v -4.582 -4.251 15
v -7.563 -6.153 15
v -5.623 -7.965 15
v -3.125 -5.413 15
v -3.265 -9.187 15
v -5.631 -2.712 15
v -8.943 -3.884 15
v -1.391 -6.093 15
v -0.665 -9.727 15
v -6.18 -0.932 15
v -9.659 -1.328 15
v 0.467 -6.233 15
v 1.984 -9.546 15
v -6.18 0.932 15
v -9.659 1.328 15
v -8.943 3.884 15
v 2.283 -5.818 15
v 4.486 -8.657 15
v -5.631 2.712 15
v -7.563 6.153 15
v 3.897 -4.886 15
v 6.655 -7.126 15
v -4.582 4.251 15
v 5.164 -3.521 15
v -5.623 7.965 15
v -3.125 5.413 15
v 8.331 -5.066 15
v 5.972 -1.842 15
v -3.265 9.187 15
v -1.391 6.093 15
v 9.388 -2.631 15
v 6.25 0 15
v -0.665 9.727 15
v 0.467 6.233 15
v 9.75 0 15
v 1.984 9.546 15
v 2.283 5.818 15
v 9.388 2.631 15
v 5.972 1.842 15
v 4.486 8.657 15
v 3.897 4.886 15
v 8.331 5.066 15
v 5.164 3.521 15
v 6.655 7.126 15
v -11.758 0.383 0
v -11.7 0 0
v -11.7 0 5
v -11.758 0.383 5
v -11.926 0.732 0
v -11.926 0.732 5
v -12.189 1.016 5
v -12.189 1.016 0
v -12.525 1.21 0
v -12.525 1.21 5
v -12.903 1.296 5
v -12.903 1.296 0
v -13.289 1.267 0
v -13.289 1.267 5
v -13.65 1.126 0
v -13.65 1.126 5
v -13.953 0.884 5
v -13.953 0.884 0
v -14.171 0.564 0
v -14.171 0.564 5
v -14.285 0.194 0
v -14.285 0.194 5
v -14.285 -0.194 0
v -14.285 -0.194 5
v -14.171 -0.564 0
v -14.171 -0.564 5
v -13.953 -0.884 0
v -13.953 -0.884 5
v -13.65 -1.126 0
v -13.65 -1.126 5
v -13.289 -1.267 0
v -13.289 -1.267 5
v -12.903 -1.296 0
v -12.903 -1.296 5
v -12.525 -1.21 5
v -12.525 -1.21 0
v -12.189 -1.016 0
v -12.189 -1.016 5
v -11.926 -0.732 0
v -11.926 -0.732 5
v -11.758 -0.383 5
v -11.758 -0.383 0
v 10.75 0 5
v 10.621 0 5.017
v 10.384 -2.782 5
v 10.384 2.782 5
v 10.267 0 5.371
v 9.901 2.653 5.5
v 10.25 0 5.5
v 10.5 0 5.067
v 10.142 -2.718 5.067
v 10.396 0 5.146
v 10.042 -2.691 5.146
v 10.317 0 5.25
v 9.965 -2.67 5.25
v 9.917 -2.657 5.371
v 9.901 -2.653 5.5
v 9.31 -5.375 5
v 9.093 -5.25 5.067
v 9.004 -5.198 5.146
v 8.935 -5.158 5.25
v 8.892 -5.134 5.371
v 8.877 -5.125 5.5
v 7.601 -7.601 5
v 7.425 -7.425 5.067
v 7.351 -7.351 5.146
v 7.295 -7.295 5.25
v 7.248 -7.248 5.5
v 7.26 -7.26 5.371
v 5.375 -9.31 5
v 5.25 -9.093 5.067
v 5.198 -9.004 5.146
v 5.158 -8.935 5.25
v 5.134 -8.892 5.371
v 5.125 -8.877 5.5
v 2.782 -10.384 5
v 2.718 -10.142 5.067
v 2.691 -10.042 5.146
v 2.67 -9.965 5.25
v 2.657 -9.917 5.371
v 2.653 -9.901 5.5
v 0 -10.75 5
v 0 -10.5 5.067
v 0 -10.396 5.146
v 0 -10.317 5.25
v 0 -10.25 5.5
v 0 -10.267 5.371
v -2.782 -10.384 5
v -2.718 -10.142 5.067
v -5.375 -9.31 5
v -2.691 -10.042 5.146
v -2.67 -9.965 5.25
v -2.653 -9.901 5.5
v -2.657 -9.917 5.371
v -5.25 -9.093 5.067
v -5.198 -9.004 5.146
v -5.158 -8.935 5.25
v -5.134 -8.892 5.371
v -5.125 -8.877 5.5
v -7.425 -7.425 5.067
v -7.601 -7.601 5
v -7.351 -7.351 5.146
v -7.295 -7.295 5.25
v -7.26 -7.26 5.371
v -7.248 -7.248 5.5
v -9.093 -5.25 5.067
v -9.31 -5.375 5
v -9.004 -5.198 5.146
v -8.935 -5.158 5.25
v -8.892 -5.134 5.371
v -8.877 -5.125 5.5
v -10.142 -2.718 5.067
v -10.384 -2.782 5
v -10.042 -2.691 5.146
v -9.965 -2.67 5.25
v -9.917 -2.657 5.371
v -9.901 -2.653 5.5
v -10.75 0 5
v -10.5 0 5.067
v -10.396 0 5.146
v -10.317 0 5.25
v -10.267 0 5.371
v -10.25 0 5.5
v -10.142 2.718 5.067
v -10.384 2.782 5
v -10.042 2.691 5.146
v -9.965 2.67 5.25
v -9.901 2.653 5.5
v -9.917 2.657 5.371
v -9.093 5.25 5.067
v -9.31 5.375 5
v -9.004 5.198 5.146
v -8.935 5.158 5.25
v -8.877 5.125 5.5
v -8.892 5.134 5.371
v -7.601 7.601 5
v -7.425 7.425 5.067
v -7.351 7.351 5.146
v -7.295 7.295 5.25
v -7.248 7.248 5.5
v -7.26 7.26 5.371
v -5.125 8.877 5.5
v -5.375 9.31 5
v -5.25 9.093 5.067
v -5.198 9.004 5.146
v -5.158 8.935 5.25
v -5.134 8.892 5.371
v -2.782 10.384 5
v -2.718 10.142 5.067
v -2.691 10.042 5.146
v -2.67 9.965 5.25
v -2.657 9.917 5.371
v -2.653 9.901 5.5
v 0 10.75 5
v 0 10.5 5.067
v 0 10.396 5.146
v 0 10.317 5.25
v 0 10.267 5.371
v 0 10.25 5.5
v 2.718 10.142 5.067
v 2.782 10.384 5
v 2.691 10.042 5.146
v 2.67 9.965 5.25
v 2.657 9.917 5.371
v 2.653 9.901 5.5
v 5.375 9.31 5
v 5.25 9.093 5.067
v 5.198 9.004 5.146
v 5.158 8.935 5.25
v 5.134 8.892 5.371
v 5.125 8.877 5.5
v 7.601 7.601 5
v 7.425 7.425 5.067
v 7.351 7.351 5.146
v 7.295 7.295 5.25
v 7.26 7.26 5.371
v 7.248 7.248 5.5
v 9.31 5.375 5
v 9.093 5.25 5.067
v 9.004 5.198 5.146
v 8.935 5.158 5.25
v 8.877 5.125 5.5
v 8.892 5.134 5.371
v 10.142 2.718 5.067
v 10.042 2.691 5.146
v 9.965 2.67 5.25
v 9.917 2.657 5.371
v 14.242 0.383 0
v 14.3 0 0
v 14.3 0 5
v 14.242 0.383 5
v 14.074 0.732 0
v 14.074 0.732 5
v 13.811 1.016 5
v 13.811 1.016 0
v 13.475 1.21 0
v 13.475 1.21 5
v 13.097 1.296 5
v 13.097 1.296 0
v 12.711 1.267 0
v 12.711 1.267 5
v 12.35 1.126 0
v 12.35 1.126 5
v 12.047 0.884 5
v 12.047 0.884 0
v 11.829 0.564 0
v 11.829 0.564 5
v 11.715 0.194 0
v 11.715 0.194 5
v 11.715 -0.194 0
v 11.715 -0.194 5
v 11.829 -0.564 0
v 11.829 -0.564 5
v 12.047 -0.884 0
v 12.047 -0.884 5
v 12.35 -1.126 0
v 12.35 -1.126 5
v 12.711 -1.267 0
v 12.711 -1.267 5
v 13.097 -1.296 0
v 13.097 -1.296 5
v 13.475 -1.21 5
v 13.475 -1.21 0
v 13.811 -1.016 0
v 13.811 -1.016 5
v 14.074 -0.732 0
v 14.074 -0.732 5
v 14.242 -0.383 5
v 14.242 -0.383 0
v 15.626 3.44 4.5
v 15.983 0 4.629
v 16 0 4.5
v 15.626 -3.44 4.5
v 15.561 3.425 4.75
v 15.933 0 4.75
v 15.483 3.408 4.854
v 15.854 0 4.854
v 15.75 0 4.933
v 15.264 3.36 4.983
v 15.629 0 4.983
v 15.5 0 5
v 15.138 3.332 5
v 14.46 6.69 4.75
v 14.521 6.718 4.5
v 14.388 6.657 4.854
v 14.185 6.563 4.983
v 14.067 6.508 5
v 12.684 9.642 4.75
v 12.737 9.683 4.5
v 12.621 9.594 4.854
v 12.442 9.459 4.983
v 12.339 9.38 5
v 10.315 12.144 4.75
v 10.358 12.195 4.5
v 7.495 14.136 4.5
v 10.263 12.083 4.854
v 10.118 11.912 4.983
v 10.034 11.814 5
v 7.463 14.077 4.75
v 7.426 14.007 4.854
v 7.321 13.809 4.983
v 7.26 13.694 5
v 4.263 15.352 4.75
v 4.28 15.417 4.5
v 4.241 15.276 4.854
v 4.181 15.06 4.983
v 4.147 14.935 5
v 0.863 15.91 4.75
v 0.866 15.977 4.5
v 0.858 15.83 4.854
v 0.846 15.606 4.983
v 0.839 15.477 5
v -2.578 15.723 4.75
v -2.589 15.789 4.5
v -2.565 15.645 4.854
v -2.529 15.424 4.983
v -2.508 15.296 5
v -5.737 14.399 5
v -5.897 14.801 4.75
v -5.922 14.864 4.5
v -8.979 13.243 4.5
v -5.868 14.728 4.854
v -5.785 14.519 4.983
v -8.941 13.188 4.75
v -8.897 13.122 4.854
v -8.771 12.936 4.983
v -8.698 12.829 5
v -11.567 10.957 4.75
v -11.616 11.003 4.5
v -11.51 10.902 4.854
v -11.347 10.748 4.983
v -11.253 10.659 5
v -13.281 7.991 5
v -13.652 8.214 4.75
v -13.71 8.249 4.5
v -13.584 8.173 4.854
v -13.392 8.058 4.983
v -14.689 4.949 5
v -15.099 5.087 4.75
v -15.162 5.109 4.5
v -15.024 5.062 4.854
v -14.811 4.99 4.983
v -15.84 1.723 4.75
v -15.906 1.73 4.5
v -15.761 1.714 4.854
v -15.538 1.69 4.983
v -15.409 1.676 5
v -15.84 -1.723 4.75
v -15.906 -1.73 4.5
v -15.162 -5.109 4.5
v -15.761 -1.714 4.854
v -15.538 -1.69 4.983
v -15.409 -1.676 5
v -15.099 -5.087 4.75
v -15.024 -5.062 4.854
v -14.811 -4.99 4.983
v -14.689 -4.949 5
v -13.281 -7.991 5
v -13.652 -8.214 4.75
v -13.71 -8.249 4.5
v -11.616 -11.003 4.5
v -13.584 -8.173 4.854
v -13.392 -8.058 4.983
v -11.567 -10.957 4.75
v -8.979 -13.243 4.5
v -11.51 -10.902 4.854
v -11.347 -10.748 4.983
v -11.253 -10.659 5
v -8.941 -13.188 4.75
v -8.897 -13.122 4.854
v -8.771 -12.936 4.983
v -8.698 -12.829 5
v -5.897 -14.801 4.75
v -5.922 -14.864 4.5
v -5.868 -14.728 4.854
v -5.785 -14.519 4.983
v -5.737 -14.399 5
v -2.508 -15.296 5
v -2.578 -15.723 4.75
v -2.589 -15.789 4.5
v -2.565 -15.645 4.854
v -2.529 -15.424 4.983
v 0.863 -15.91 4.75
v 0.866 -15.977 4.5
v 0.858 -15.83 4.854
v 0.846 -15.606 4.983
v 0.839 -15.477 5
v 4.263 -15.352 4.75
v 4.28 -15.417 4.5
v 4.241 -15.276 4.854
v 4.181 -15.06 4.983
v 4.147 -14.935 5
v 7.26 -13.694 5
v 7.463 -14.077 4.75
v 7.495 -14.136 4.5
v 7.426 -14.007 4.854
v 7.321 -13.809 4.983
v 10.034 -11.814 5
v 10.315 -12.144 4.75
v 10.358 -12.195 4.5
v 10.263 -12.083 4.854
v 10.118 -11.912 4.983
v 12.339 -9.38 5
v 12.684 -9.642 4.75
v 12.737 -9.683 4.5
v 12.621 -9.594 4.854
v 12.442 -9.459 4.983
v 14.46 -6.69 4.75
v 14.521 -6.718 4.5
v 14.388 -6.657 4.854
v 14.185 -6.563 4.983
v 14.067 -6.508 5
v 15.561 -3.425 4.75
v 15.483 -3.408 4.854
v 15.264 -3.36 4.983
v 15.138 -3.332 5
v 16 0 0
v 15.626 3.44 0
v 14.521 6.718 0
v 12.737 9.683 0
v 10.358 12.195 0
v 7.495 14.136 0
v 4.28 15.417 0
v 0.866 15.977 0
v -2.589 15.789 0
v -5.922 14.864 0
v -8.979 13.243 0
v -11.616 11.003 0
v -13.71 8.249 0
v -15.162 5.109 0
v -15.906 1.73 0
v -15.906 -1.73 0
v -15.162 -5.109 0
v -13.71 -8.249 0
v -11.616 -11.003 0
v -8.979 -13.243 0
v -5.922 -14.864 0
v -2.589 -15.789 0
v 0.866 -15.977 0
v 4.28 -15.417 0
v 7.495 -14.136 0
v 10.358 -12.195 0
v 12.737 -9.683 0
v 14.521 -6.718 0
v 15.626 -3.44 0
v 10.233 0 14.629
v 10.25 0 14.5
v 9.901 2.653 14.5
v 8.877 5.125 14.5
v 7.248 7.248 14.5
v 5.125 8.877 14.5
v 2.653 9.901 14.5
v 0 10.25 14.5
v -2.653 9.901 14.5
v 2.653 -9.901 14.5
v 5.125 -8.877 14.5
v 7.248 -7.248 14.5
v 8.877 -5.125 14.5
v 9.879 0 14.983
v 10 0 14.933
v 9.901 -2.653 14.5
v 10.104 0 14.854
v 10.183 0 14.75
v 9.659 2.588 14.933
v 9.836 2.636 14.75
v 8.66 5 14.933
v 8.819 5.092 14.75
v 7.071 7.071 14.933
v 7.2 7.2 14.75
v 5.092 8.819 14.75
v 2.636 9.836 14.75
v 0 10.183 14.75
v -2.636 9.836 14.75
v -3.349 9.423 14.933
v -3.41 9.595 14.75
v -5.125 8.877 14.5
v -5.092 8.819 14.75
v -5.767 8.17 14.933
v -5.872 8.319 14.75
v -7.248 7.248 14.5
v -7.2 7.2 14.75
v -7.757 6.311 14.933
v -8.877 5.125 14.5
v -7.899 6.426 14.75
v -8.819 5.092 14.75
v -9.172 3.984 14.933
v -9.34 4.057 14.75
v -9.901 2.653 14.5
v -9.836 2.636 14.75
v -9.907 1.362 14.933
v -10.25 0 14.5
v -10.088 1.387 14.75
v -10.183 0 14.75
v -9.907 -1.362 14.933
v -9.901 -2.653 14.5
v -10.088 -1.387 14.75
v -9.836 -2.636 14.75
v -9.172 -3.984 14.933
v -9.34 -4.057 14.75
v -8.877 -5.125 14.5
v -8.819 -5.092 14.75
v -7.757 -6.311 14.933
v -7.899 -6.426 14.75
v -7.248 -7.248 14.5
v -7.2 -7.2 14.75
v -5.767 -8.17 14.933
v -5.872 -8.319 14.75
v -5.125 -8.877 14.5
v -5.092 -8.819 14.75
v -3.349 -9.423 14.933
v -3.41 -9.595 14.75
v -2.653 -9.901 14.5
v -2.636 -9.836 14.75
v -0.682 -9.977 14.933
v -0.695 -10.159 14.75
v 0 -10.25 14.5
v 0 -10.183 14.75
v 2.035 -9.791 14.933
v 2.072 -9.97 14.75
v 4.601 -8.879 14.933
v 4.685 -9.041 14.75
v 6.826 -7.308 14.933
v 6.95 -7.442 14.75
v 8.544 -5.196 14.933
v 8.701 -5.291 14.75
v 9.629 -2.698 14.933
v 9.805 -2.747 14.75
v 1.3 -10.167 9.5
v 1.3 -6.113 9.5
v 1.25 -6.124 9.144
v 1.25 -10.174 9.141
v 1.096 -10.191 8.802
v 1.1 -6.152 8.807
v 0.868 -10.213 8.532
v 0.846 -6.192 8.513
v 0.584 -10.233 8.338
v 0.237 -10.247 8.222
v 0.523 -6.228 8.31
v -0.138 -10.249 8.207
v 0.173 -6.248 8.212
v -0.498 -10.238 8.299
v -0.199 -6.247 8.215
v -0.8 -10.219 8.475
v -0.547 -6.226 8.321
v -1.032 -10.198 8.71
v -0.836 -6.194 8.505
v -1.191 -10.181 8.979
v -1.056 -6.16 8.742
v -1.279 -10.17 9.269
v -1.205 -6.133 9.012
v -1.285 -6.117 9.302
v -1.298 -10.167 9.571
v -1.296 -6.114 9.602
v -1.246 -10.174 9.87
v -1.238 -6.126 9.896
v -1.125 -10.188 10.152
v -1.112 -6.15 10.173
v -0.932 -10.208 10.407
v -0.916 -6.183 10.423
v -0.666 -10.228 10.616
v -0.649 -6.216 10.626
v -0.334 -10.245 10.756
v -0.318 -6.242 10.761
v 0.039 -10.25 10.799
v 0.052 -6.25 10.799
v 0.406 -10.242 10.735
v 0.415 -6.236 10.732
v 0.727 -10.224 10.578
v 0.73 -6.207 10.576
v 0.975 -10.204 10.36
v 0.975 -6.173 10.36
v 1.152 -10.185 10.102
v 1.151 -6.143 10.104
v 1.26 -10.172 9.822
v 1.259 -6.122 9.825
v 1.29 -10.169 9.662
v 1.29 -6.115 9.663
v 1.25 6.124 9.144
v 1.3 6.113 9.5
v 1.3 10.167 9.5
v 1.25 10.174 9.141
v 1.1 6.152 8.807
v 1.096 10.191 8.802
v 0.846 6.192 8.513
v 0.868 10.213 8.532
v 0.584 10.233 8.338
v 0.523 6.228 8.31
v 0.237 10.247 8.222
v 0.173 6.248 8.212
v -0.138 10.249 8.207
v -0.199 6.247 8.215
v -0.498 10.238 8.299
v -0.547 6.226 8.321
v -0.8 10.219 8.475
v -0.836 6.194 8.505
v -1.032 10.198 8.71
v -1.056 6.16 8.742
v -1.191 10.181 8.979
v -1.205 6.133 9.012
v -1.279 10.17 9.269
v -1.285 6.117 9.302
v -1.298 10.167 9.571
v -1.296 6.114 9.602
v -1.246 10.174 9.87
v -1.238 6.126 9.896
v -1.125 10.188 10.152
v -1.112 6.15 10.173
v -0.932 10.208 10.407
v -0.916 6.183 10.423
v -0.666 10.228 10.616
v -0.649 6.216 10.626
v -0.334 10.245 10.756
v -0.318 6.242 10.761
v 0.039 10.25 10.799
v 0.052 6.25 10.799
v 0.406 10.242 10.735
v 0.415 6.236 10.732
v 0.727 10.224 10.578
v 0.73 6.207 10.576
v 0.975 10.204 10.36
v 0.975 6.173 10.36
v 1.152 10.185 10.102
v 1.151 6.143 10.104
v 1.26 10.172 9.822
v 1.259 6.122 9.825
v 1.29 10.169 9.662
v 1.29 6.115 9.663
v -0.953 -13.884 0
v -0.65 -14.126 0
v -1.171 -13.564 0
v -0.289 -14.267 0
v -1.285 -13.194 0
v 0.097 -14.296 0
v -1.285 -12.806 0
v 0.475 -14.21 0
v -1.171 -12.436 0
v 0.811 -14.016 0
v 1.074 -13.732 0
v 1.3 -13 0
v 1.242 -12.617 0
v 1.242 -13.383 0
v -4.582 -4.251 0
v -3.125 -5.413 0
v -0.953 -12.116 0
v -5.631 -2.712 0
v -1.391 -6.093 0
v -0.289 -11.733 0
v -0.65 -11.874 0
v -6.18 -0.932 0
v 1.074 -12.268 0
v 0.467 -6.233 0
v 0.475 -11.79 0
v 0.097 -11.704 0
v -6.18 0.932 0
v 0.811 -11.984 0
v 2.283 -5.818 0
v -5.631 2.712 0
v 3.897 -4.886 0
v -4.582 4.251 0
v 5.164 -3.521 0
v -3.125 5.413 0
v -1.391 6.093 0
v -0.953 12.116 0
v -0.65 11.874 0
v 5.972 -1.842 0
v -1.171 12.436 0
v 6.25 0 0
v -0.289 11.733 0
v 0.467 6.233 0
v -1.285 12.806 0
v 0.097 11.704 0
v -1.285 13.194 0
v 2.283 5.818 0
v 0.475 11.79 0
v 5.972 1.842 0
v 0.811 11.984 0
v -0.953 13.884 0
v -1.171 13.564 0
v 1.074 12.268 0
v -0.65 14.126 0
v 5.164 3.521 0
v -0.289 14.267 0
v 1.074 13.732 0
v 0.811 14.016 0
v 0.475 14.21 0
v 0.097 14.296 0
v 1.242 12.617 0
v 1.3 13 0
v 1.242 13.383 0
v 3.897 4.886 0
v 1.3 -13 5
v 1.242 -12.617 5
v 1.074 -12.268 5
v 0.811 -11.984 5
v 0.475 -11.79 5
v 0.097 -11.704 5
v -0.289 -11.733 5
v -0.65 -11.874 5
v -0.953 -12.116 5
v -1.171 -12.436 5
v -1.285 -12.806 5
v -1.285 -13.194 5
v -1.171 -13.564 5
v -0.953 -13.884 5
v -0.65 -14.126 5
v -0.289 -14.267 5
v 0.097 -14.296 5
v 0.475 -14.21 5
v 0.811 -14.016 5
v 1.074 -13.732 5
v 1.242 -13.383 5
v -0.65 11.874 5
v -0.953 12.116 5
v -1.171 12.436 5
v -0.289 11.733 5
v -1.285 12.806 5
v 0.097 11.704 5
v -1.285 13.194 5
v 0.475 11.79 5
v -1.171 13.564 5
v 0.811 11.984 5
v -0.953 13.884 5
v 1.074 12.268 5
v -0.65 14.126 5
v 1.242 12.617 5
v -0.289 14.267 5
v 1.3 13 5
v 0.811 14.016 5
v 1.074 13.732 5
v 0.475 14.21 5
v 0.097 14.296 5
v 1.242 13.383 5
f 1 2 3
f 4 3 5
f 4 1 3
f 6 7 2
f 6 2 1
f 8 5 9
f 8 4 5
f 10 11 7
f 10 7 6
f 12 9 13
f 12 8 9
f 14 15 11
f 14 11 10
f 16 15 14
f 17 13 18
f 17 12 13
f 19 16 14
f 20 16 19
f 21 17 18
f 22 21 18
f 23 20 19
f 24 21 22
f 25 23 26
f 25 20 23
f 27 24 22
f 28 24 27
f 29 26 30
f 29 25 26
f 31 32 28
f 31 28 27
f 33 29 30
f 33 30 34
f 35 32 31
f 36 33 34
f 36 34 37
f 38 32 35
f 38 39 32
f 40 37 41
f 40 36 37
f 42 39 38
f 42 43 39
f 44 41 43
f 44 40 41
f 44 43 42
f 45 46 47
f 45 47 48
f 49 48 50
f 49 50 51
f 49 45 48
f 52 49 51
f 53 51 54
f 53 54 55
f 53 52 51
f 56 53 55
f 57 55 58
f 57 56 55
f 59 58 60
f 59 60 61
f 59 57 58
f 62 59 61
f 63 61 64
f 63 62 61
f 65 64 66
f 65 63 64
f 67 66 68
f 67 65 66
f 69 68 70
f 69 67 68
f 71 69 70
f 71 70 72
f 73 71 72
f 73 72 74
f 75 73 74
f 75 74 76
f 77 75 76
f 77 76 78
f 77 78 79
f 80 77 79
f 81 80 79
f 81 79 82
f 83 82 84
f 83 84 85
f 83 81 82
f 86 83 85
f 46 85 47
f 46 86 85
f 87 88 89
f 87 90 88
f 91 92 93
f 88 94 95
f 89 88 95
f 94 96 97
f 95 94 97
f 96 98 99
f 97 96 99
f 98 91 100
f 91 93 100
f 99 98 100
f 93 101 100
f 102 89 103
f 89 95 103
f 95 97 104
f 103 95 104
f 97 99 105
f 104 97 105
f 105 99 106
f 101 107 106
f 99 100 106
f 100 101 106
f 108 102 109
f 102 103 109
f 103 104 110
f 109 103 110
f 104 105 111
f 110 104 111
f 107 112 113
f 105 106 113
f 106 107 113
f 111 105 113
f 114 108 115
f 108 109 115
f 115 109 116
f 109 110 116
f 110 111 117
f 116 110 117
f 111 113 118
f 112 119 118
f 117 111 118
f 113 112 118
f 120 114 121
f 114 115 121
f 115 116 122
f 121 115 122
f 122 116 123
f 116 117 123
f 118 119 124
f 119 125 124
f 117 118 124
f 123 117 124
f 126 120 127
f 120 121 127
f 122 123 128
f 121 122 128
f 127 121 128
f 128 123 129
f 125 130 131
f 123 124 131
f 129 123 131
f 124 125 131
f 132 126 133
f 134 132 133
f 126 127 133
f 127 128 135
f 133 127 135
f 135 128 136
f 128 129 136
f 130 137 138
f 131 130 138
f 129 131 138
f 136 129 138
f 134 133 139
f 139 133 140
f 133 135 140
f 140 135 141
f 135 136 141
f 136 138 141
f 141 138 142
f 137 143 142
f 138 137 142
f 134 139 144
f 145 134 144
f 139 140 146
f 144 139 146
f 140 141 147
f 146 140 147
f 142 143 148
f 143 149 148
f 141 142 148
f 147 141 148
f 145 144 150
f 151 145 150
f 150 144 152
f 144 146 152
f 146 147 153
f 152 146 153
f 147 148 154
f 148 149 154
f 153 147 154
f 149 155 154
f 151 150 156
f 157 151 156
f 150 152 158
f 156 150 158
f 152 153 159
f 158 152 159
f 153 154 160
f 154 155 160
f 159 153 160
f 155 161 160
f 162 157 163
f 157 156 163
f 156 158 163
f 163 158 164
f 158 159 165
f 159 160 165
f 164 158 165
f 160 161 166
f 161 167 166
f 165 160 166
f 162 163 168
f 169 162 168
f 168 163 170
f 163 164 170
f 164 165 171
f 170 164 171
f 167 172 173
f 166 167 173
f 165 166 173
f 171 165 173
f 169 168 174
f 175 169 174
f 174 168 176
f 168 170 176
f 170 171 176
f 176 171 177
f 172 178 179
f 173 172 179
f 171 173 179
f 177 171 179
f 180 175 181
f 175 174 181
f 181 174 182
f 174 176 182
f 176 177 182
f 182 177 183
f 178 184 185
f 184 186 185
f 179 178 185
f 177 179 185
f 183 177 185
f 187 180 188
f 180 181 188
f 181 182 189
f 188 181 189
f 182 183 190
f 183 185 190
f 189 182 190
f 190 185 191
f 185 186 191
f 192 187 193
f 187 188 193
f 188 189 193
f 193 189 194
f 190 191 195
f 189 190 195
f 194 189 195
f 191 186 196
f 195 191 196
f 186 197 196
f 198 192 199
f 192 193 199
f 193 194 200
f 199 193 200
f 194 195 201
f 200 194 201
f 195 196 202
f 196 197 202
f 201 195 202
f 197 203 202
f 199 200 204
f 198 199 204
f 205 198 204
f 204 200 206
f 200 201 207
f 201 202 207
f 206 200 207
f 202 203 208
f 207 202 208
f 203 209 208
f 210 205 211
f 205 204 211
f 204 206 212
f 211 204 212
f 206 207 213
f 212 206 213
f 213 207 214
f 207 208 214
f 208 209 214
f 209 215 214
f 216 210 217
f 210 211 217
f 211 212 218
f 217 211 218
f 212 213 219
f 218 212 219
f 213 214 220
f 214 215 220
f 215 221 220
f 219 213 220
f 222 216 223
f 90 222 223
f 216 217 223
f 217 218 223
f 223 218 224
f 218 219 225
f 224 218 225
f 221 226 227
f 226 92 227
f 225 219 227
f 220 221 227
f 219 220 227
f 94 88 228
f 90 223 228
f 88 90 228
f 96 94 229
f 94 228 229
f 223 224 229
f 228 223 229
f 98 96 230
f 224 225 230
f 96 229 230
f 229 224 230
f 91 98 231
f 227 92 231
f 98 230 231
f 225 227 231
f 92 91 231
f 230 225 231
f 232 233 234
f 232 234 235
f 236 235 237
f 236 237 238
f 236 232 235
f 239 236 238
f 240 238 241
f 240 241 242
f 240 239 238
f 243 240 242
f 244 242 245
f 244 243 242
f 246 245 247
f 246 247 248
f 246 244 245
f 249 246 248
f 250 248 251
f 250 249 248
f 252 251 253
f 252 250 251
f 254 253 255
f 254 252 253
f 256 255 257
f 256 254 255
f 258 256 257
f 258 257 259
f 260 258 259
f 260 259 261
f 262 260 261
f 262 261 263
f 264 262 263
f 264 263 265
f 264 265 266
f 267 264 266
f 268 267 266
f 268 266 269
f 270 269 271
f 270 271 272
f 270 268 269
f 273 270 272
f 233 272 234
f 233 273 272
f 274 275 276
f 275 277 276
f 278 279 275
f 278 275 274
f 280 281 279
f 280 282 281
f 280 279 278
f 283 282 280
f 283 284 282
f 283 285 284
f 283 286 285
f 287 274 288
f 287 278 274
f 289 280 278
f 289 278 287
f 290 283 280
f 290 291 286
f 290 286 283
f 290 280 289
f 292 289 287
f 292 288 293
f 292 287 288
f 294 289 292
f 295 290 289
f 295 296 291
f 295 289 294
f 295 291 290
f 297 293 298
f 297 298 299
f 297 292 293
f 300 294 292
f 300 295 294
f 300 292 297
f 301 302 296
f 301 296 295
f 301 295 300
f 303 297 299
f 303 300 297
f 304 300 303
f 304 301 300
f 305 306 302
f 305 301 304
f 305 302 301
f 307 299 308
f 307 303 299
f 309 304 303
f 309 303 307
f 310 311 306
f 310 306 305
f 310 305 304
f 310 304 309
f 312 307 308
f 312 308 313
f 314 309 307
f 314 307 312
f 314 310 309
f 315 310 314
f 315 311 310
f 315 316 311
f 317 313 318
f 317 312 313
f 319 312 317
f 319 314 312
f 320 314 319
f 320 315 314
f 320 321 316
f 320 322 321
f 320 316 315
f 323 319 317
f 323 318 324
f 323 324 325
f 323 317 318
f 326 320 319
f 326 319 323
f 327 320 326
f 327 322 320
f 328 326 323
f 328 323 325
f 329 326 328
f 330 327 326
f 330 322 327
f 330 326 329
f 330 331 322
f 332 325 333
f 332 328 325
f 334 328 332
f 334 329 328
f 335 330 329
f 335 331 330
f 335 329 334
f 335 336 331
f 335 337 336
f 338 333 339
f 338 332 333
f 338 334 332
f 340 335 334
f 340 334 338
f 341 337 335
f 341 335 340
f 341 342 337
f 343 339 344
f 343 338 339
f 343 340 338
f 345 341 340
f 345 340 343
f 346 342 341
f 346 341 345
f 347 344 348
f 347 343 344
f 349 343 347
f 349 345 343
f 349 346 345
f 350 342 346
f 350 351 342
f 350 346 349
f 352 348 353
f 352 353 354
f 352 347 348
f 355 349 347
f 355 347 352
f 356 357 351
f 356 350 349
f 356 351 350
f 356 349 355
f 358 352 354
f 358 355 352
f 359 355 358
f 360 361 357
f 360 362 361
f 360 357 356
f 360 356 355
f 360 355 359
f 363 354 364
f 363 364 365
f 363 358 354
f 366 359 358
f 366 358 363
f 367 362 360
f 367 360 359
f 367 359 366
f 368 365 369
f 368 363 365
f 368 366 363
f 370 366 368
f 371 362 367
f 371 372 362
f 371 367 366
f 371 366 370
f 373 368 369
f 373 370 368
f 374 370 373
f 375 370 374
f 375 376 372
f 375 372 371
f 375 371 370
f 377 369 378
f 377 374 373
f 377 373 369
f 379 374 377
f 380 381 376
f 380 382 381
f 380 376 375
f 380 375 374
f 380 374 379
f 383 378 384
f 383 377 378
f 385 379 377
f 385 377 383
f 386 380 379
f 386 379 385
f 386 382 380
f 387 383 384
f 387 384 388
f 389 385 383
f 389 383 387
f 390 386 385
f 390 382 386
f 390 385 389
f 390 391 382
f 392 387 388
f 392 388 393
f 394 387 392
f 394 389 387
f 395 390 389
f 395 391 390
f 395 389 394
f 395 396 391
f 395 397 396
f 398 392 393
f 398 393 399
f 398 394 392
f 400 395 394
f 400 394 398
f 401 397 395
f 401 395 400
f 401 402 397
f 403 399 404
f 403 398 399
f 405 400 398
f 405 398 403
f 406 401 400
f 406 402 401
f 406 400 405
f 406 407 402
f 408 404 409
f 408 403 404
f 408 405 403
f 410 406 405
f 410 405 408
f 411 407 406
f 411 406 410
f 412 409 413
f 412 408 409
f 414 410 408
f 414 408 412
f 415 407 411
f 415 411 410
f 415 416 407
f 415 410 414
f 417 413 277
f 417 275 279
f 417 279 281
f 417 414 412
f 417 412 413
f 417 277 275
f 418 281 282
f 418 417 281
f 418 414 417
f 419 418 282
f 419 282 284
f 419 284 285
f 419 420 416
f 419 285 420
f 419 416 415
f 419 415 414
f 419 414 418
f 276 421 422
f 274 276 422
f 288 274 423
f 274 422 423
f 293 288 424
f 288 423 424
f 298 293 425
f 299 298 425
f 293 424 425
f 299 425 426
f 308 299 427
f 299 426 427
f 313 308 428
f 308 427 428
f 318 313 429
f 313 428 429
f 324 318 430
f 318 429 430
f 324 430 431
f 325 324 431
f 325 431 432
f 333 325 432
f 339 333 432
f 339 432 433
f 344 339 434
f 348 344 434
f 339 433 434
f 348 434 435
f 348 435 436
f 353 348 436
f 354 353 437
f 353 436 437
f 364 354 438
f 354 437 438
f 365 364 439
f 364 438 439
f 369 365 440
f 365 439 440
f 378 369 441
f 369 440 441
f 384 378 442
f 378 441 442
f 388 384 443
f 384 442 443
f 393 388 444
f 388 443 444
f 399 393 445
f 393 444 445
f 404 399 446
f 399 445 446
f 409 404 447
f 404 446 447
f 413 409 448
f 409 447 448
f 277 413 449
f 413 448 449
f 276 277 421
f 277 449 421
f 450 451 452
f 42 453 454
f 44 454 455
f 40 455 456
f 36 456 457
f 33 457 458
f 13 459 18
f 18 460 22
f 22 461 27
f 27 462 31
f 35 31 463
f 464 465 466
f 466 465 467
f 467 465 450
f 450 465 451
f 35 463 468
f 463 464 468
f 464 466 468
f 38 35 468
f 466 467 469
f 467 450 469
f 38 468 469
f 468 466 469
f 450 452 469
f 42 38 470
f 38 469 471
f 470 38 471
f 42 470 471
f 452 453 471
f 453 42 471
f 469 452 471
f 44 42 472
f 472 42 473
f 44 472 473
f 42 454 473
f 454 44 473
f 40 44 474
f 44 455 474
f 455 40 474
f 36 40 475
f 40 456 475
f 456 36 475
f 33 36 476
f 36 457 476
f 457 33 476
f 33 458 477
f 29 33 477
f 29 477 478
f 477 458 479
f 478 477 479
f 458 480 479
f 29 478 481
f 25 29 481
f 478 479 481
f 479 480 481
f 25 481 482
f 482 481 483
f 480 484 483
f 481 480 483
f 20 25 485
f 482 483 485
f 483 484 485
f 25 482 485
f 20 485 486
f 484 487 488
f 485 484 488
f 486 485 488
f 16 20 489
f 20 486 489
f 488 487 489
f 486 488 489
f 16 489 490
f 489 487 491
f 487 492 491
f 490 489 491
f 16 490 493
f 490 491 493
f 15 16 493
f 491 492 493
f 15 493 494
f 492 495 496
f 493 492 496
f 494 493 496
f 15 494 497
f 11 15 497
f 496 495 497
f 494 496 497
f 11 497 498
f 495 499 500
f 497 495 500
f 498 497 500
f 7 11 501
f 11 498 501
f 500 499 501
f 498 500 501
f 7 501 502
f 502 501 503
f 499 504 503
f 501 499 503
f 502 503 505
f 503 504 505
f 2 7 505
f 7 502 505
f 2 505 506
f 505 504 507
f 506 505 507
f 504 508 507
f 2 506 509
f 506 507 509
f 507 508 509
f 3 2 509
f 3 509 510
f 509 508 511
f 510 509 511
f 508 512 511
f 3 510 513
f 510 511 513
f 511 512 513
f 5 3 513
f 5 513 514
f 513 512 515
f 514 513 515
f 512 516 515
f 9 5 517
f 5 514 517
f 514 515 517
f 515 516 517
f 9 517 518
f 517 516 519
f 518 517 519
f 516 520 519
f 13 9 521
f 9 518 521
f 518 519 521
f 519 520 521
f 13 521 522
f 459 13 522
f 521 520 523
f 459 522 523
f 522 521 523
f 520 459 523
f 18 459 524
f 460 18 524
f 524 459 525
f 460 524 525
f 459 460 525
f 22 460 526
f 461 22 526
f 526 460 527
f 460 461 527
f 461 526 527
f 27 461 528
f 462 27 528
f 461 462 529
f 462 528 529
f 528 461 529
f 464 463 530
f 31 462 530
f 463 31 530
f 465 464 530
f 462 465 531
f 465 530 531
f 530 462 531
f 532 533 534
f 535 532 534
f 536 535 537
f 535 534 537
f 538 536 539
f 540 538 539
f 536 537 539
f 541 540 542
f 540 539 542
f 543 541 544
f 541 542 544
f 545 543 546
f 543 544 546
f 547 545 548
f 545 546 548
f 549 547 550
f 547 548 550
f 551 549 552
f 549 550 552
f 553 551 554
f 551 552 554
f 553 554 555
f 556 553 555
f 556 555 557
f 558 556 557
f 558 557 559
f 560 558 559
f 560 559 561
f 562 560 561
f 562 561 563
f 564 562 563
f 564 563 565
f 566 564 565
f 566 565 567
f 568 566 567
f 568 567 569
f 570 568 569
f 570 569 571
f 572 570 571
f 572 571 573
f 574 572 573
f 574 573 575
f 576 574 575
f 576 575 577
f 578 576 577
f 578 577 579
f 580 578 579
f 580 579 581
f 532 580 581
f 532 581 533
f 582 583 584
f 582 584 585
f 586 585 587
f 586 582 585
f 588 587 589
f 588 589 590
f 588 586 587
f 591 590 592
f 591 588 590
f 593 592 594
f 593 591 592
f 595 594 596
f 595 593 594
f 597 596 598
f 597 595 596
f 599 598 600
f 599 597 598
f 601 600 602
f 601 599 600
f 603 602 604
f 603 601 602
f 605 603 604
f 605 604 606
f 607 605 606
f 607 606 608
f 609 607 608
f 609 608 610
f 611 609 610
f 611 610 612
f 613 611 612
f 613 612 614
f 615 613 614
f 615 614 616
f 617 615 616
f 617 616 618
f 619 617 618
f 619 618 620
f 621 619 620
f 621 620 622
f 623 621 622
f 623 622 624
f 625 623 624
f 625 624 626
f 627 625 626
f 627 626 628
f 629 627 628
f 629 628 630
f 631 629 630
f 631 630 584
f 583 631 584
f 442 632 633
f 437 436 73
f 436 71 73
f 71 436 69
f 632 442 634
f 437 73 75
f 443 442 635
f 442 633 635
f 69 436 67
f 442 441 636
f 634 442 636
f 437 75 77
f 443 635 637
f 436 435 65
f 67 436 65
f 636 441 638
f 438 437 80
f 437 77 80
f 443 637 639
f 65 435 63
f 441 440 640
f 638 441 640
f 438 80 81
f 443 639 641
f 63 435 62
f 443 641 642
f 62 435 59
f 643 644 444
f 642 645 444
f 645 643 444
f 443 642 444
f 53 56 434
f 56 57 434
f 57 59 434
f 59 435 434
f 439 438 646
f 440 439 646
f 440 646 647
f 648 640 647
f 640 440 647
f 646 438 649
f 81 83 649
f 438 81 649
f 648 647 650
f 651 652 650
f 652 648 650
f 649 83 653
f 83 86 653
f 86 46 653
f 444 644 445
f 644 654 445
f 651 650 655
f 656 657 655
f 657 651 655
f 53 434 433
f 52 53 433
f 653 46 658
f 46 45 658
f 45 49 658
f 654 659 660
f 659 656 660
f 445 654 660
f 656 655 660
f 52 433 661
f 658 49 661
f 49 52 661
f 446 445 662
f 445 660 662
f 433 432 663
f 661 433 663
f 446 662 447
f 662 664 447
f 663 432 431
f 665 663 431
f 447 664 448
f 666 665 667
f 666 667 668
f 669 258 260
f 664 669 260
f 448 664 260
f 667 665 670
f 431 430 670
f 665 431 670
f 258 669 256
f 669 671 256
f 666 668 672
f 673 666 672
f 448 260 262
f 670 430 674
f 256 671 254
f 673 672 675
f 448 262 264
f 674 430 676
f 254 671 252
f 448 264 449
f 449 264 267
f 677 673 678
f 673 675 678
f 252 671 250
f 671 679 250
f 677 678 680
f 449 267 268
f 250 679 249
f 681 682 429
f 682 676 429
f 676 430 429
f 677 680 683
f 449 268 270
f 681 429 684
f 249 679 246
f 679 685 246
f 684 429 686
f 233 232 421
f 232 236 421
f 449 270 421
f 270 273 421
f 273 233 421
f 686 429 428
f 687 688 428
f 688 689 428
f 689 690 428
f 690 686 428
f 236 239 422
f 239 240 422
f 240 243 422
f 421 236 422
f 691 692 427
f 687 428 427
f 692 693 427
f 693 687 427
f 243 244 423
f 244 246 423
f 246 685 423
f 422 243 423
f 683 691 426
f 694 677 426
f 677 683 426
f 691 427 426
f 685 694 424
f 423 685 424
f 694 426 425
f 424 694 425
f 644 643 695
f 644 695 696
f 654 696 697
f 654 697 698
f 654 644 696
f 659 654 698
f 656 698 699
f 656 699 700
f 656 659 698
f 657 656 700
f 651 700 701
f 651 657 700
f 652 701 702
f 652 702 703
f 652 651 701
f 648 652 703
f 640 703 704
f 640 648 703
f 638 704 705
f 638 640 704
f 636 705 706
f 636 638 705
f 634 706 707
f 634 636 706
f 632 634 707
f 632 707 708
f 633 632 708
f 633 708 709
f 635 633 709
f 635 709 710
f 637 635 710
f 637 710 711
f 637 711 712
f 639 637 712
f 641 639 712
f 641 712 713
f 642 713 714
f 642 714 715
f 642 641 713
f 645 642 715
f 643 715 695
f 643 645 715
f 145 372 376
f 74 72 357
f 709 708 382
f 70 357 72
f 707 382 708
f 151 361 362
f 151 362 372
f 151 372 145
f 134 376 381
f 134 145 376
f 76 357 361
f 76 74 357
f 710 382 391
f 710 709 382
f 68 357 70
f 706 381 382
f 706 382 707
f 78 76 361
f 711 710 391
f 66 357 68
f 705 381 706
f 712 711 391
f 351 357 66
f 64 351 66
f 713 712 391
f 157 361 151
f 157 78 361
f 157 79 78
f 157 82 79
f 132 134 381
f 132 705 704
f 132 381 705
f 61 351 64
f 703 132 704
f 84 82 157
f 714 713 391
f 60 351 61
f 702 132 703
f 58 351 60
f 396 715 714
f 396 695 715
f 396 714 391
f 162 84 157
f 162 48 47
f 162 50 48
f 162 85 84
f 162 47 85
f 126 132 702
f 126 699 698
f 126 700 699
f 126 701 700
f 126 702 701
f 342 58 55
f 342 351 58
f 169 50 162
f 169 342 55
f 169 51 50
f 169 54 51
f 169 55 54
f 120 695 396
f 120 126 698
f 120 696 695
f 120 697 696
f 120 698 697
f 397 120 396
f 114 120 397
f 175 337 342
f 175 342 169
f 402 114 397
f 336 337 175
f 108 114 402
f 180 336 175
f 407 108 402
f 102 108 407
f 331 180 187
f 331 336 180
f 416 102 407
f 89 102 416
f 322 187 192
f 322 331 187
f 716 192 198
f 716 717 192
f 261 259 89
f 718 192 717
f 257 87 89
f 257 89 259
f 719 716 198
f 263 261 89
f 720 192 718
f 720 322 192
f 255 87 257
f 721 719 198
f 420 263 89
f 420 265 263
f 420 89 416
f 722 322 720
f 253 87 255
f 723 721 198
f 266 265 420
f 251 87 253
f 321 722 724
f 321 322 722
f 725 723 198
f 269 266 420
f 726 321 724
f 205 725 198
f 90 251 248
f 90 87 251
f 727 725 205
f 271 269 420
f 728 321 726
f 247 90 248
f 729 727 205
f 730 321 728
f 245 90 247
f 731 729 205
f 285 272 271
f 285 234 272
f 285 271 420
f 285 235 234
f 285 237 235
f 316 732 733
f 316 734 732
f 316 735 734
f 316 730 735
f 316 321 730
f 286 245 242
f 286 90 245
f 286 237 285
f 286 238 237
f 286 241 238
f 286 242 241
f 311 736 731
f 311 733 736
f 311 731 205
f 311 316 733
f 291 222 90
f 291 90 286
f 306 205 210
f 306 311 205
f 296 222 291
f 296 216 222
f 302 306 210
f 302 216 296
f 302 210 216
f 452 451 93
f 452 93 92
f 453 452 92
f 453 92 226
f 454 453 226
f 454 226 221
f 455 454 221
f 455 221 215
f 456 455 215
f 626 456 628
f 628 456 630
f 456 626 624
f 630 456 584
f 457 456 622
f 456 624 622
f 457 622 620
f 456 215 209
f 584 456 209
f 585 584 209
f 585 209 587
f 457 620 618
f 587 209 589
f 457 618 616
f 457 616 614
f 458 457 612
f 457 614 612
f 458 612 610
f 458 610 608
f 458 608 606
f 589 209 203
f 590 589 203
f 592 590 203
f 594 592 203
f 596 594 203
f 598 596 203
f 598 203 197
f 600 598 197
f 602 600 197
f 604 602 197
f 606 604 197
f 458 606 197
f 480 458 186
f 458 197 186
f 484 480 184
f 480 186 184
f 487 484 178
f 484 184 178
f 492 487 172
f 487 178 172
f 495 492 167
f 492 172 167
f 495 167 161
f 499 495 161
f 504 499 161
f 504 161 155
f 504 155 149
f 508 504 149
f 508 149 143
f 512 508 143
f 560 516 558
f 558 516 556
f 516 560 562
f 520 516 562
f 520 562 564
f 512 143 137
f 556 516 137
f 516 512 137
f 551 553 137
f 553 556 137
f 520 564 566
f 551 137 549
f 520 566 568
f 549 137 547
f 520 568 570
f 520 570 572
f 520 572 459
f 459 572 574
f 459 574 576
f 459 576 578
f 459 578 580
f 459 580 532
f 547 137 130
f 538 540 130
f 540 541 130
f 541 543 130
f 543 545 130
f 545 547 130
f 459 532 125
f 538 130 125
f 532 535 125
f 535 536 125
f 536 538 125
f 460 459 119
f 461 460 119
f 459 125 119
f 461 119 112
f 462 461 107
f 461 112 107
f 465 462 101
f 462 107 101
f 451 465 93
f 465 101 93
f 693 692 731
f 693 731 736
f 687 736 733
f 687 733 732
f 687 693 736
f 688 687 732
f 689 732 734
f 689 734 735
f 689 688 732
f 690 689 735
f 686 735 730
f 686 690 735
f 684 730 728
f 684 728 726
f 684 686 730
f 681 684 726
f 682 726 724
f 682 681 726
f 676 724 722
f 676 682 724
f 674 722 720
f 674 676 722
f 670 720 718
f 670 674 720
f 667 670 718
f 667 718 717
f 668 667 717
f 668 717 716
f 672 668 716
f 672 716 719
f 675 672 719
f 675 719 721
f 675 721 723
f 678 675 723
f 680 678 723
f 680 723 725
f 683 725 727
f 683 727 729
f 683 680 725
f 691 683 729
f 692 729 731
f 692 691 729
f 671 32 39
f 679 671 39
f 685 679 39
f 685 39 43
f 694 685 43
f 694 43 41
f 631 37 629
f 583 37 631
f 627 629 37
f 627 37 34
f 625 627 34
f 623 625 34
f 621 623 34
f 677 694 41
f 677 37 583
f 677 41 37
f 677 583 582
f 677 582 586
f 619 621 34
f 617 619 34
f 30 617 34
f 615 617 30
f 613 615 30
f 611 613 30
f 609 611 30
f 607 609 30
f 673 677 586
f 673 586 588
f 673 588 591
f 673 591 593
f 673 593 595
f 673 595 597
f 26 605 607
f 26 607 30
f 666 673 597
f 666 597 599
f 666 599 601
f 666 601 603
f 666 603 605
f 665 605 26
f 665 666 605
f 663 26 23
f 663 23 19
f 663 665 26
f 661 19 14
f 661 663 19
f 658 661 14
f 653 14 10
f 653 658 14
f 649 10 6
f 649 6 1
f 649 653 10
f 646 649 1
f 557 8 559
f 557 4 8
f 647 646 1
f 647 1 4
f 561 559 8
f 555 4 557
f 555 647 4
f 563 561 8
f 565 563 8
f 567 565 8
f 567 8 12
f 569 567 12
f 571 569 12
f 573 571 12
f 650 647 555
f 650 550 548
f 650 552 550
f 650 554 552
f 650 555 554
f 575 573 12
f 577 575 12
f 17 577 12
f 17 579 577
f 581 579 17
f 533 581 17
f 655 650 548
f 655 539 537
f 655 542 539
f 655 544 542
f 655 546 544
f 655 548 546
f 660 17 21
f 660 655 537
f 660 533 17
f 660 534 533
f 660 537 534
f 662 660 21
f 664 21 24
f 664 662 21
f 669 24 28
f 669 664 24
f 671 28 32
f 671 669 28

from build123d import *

# Parameters (mm, degrees)
SKETCH1_R               = 16
SKETCH1_R_2             = 1.3
SKETCH1_R_3             = 6.25
BOSS_EXTRUDE1_DEPTH     = 5
SKETCH3_R               = 10.25
SKETCH3_R_2             = 6.25
BOSS_EXTRUDE2_DEPTH     = 15
SKETCH4_R               = 1.3
CUT_EXTRUDE5_DEPTH      = 17
CUT_EXTRUDE5_DEPTH_BACK = 17
FILLET1_R               = 0.5


with BuildPart() as part:
    # Sketch1 → Boss-Extrude1 (new body)
    with BuildSketch(Plane.XY):
        Circle(SKETCH1_R)
        with Locations((0, 13)):
            Circle(SKETCH1_R_2, mode=Mode.SUBTRACT)
        with Locations((13, 0)):
            Circle(SKETCH1_R_2, mode=Mode.SUBTRACT)
        with Locations((0, -13)):
            Circle(SKETCH1_R_2, mode=Mode.SUBTRACT)
        with Locations((-13, 0)):
            Circle(SKETCH1_R_2, mode=Mode.SUBTRACT)
        Circle(SKETCH1_R_3, mode=Mode.SUBTRACT)
    extrude(amount=BOSS_EXTRUDE1_DEPTH)

    # Sketch3 → Boss-Extrude2 (add)
    with BuildSketch(Plane.XY):
        Circle(SKETCH3_R)
        Circle(SKETCH3_R_2, mode=Mode.SUBTRACT)
    extrude(amount=BOSS_EXTRUDE2_DEPTH)

    # Sketch4 → Cut-Extrude5 (cut, two sides)
    with BuildSketch(Plane(origin=(0, 0, 0), x_dir=(1, 0, 0), z_dir=(0, 1, 0))) as cut_extrude5_sk:
        with Locations((0, -9.5)):
            Circle(SKETCH4_R)
    extrude(amount=CUT_EXTRUDE5_DEPTH, mode=Mode.SUBTRACT)
    extrude(cut_extrude5_sk.sketch, amount=-CUT_EXTRUDE5_DEPTH_BACK, mode=Mode.SUBTRACT)

    # Fillet1
    fillet1_edges = [part.edges().sort_by_distance(p)[0] for p in [
        (-10.25, 0, 5),
        (-10.25, 0, 15),
        (-16, 0, 5),
    ]]
    fillet(fillet1_edges, radius=FILLET1_R)


solid = part.part
